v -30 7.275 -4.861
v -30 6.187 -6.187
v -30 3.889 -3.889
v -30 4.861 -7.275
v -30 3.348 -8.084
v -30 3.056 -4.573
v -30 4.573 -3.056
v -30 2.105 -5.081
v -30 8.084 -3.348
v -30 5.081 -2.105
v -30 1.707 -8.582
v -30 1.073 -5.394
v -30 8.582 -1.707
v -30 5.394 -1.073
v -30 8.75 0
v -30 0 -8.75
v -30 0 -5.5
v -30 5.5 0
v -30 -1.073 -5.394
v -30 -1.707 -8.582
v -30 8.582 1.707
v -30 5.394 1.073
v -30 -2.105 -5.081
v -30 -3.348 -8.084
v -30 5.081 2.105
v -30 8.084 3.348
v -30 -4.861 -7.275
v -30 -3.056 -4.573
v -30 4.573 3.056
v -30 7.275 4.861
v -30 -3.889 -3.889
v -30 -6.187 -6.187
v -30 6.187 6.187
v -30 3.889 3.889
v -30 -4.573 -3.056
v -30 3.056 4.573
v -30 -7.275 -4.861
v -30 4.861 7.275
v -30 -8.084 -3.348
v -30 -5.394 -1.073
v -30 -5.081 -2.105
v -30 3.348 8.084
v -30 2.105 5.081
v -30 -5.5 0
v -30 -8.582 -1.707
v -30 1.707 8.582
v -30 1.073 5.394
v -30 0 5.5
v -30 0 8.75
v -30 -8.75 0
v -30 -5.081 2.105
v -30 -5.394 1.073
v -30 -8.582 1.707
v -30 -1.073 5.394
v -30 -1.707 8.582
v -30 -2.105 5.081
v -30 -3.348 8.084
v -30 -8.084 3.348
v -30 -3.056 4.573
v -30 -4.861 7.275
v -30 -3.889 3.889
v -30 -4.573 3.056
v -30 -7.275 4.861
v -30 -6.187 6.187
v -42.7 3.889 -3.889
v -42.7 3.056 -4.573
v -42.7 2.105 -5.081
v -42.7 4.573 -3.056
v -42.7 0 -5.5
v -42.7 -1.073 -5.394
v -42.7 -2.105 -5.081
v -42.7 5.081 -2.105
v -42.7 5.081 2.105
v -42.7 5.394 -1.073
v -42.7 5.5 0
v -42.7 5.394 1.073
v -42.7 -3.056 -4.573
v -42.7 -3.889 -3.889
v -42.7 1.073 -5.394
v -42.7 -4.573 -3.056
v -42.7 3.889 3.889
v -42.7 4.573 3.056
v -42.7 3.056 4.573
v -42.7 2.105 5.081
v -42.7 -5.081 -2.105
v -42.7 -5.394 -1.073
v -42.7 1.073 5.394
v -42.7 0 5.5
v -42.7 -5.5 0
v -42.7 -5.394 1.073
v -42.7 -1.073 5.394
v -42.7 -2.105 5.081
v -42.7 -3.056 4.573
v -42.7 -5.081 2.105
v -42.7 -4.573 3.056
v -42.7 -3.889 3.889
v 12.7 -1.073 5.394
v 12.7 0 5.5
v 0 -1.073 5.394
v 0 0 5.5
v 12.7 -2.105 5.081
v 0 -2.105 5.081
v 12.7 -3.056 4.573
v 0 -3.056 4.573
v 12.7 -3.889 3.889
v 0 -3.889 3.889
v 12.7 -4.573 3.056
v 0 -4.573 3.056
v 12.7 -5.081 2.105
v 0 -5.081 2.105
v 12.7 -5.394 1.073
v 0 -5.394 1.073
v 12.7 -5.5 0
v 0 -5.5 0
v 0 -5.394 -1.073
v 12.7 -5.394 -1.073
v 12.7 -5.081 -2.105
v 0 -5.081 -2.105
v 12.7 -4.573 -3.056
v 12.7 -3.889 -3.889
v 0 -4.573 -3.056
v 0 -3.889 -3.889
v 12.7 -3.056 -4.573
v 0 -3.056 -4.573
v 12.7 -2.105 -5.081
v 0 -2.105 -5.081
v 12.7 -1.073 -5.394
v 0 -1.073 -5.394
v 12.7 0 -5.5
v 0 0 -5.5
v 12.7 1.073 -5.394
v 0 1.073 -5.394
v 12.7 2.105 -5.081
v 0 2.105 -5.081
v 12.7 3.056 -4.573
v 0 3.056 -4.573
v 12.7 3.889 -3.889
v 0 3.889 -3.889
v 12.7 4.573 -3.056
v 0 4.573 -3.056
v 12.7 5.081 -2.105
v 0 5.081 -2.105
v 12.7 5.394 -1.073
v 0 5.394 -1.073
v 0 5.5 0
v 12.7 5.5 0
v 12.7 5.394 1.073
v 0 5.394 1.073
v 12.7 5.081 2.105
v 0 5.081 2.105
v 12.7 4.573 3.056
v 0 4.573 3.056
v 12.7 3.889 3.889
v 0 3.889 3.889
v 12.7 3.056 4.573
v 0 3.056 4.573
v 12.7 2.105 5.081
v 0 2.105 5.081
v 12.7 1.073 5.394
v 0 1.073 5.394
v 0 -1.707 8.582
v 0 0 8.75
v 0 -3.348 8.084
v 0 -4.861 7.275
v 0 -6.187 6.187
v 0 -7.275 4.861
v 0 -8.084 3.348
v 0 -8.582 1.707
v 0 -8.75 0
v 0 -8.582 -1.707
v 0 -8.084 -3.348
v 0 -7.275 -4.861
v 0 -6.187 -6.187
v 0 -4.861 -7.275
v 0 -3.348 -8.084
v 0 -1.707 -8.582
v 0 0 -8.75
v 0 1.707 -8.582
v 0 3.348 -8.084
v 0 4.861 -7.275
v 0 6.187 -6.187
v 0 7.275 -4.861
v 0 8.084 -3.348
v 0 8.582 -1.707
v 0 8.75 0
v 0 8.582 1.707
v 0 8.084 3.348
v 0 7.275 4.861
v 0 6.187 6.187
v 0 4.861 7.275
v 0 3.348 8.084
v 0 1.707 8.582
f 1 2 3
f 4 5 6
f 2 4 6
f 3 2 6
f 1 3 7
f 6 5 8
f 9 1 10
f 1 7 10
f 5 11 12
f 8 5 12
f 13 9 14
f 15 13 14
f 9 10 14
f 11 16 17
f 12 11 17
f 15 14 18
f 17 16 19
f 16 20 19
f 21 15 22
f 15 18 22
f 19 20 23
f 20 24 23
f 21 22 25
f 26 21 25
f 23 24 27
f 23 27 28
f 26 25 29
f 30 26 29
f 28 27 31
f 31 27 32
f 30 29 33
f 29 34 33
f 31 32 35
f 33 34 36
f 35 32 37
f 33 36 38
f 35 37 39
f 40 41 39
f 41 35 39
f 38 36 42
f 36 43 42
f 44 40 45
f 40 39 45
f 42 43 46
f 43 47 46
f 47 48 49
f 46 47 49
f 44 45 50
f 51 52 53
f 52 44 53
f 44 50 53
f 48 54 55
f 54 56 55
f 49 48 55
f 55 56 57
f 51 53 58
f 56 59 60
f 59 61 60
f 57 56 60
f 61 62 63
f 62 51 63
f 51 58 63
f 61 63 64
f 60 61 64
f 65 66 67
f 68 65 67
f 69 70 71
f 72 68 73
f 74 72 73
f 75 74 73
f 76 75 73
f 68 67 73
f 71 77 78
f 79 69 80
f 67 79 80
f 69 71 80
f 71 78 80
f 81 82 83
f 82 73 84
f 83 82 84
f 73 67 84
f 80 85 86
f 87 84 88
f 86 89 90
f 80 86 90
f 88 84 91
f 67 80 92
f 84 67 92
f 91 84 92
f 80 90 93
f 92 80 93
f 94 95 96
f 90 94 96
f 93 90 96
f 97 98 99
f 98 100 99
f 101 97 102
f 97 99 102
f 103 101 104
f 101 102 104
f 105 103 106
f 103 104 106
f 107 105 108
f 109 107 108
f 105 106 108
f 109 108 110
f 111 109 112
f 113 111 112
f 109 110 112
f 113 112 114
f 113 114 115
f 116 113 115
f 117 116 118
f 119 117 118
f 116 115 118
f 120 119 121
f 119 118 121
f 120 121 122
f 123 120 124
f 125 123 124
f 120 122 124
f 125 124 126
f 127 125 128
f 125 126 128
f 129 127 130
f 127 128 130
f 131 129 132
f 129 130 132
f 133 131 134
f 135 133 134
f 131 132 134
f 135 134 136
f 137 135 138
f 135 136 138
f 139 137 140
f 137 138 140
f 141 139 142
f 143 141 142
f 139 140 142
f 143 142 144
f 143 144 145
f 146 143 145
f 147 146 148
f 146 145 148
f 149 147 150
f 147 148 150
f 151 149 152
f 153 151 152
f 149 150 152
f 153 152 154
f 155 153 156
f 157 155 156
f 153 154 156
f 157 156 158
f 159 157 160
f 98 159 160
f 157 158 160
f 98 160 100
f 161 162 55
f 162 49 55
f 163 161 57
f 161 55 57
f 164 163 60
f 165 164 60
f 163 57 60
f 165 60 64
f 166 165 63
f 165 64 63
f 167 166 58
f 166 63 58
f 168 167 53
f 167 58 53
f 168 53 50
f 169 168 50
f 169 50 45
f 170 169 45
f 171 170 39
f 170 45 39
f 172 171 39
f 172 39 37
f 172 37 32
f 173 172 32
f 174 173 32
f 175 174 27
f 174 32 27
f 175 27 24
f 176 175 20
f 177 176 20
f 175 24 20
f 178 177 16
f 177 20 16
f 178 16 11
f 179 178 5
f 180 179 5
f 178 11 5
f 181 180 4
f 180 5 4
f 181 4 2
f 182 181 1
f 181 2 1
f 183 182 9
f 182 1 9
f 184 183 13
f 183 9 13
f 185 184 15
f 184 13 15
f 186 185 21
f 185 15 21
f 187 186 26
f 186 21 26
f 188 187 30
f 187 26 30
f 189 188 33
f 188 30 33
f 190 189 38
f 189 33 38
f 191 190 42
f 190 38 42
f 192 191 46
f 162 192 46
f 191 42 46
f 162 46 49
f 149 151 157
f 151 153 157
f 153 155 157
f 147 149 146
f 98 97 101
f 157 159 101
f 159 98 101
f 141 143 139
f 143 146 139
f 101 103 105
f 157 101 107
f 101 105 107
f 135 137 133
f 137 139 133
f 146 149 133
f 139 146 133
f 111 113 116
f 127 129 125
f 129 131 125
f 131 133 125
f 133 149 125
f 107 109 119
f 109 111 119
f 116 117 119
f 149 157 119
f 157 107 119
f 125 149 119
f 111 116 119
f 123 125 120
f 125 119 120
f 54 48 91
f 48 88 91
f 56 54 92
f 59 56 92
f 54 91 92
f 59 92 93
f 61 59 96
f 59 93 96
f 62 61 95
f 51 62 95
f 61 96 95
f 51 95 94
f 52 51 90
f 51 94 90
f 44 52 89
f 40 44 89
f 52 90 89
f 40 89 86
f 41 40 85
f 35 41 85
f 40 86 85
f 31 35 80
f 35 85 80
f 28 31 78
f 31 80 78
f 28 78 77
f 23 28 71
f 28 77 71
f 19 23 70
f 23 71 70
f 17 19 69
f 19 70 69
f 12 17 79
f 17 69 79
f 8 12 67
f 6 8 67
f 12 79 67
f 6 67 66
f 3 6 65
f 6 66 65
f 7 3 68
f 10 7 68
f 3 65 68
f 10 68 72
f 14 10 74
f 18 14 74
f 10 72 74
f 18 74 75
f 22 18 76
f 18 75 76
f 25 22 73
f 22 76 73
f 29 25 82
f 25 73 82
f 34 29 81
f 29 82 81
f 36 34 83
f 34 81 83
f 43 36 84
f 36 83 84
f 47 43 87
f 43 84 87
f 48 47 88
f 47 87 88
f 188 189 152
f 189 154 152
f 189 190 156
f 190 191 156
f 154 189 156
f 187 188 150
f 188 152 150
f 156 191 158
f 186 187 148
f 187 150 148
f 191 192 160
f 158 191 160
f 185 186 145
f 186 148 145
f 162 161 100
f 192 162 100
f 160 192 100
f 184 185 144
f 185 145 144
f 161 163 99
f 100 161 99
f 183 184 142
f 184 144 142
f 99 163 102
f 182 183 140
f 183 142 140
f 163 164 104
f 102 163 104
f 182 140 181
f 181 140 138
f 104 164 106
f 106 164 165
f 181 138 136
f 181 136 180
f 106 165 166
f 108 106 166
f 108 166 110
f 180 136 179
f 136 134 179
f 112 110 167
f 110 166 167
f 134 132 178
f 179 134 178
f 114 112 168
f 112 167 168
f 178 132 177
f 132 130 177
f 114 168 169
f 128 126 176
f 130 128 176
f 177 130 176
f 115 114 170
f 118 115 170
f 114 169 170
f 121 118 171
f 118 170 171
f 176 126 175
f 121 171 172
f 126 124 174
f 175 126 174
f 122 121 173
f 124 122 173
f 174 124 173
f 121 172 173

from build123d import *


with BuildPart() as part:
    # CV_Western_4M Sketch → CV_Western_4M (revolve)
    with BuildSketch(Plane.XY):
        Polygon((12.7, 0), (12.7, 5.5), (0, 5.5), (0, 8.75), (-30, 8.75), (-30, 5.5), (-42.7, 5.5), (-42.7, 0), align=None)
    revolve(axis=Axis((-1000, 0, 0), (1, 0, 0)))


solid = part.part
